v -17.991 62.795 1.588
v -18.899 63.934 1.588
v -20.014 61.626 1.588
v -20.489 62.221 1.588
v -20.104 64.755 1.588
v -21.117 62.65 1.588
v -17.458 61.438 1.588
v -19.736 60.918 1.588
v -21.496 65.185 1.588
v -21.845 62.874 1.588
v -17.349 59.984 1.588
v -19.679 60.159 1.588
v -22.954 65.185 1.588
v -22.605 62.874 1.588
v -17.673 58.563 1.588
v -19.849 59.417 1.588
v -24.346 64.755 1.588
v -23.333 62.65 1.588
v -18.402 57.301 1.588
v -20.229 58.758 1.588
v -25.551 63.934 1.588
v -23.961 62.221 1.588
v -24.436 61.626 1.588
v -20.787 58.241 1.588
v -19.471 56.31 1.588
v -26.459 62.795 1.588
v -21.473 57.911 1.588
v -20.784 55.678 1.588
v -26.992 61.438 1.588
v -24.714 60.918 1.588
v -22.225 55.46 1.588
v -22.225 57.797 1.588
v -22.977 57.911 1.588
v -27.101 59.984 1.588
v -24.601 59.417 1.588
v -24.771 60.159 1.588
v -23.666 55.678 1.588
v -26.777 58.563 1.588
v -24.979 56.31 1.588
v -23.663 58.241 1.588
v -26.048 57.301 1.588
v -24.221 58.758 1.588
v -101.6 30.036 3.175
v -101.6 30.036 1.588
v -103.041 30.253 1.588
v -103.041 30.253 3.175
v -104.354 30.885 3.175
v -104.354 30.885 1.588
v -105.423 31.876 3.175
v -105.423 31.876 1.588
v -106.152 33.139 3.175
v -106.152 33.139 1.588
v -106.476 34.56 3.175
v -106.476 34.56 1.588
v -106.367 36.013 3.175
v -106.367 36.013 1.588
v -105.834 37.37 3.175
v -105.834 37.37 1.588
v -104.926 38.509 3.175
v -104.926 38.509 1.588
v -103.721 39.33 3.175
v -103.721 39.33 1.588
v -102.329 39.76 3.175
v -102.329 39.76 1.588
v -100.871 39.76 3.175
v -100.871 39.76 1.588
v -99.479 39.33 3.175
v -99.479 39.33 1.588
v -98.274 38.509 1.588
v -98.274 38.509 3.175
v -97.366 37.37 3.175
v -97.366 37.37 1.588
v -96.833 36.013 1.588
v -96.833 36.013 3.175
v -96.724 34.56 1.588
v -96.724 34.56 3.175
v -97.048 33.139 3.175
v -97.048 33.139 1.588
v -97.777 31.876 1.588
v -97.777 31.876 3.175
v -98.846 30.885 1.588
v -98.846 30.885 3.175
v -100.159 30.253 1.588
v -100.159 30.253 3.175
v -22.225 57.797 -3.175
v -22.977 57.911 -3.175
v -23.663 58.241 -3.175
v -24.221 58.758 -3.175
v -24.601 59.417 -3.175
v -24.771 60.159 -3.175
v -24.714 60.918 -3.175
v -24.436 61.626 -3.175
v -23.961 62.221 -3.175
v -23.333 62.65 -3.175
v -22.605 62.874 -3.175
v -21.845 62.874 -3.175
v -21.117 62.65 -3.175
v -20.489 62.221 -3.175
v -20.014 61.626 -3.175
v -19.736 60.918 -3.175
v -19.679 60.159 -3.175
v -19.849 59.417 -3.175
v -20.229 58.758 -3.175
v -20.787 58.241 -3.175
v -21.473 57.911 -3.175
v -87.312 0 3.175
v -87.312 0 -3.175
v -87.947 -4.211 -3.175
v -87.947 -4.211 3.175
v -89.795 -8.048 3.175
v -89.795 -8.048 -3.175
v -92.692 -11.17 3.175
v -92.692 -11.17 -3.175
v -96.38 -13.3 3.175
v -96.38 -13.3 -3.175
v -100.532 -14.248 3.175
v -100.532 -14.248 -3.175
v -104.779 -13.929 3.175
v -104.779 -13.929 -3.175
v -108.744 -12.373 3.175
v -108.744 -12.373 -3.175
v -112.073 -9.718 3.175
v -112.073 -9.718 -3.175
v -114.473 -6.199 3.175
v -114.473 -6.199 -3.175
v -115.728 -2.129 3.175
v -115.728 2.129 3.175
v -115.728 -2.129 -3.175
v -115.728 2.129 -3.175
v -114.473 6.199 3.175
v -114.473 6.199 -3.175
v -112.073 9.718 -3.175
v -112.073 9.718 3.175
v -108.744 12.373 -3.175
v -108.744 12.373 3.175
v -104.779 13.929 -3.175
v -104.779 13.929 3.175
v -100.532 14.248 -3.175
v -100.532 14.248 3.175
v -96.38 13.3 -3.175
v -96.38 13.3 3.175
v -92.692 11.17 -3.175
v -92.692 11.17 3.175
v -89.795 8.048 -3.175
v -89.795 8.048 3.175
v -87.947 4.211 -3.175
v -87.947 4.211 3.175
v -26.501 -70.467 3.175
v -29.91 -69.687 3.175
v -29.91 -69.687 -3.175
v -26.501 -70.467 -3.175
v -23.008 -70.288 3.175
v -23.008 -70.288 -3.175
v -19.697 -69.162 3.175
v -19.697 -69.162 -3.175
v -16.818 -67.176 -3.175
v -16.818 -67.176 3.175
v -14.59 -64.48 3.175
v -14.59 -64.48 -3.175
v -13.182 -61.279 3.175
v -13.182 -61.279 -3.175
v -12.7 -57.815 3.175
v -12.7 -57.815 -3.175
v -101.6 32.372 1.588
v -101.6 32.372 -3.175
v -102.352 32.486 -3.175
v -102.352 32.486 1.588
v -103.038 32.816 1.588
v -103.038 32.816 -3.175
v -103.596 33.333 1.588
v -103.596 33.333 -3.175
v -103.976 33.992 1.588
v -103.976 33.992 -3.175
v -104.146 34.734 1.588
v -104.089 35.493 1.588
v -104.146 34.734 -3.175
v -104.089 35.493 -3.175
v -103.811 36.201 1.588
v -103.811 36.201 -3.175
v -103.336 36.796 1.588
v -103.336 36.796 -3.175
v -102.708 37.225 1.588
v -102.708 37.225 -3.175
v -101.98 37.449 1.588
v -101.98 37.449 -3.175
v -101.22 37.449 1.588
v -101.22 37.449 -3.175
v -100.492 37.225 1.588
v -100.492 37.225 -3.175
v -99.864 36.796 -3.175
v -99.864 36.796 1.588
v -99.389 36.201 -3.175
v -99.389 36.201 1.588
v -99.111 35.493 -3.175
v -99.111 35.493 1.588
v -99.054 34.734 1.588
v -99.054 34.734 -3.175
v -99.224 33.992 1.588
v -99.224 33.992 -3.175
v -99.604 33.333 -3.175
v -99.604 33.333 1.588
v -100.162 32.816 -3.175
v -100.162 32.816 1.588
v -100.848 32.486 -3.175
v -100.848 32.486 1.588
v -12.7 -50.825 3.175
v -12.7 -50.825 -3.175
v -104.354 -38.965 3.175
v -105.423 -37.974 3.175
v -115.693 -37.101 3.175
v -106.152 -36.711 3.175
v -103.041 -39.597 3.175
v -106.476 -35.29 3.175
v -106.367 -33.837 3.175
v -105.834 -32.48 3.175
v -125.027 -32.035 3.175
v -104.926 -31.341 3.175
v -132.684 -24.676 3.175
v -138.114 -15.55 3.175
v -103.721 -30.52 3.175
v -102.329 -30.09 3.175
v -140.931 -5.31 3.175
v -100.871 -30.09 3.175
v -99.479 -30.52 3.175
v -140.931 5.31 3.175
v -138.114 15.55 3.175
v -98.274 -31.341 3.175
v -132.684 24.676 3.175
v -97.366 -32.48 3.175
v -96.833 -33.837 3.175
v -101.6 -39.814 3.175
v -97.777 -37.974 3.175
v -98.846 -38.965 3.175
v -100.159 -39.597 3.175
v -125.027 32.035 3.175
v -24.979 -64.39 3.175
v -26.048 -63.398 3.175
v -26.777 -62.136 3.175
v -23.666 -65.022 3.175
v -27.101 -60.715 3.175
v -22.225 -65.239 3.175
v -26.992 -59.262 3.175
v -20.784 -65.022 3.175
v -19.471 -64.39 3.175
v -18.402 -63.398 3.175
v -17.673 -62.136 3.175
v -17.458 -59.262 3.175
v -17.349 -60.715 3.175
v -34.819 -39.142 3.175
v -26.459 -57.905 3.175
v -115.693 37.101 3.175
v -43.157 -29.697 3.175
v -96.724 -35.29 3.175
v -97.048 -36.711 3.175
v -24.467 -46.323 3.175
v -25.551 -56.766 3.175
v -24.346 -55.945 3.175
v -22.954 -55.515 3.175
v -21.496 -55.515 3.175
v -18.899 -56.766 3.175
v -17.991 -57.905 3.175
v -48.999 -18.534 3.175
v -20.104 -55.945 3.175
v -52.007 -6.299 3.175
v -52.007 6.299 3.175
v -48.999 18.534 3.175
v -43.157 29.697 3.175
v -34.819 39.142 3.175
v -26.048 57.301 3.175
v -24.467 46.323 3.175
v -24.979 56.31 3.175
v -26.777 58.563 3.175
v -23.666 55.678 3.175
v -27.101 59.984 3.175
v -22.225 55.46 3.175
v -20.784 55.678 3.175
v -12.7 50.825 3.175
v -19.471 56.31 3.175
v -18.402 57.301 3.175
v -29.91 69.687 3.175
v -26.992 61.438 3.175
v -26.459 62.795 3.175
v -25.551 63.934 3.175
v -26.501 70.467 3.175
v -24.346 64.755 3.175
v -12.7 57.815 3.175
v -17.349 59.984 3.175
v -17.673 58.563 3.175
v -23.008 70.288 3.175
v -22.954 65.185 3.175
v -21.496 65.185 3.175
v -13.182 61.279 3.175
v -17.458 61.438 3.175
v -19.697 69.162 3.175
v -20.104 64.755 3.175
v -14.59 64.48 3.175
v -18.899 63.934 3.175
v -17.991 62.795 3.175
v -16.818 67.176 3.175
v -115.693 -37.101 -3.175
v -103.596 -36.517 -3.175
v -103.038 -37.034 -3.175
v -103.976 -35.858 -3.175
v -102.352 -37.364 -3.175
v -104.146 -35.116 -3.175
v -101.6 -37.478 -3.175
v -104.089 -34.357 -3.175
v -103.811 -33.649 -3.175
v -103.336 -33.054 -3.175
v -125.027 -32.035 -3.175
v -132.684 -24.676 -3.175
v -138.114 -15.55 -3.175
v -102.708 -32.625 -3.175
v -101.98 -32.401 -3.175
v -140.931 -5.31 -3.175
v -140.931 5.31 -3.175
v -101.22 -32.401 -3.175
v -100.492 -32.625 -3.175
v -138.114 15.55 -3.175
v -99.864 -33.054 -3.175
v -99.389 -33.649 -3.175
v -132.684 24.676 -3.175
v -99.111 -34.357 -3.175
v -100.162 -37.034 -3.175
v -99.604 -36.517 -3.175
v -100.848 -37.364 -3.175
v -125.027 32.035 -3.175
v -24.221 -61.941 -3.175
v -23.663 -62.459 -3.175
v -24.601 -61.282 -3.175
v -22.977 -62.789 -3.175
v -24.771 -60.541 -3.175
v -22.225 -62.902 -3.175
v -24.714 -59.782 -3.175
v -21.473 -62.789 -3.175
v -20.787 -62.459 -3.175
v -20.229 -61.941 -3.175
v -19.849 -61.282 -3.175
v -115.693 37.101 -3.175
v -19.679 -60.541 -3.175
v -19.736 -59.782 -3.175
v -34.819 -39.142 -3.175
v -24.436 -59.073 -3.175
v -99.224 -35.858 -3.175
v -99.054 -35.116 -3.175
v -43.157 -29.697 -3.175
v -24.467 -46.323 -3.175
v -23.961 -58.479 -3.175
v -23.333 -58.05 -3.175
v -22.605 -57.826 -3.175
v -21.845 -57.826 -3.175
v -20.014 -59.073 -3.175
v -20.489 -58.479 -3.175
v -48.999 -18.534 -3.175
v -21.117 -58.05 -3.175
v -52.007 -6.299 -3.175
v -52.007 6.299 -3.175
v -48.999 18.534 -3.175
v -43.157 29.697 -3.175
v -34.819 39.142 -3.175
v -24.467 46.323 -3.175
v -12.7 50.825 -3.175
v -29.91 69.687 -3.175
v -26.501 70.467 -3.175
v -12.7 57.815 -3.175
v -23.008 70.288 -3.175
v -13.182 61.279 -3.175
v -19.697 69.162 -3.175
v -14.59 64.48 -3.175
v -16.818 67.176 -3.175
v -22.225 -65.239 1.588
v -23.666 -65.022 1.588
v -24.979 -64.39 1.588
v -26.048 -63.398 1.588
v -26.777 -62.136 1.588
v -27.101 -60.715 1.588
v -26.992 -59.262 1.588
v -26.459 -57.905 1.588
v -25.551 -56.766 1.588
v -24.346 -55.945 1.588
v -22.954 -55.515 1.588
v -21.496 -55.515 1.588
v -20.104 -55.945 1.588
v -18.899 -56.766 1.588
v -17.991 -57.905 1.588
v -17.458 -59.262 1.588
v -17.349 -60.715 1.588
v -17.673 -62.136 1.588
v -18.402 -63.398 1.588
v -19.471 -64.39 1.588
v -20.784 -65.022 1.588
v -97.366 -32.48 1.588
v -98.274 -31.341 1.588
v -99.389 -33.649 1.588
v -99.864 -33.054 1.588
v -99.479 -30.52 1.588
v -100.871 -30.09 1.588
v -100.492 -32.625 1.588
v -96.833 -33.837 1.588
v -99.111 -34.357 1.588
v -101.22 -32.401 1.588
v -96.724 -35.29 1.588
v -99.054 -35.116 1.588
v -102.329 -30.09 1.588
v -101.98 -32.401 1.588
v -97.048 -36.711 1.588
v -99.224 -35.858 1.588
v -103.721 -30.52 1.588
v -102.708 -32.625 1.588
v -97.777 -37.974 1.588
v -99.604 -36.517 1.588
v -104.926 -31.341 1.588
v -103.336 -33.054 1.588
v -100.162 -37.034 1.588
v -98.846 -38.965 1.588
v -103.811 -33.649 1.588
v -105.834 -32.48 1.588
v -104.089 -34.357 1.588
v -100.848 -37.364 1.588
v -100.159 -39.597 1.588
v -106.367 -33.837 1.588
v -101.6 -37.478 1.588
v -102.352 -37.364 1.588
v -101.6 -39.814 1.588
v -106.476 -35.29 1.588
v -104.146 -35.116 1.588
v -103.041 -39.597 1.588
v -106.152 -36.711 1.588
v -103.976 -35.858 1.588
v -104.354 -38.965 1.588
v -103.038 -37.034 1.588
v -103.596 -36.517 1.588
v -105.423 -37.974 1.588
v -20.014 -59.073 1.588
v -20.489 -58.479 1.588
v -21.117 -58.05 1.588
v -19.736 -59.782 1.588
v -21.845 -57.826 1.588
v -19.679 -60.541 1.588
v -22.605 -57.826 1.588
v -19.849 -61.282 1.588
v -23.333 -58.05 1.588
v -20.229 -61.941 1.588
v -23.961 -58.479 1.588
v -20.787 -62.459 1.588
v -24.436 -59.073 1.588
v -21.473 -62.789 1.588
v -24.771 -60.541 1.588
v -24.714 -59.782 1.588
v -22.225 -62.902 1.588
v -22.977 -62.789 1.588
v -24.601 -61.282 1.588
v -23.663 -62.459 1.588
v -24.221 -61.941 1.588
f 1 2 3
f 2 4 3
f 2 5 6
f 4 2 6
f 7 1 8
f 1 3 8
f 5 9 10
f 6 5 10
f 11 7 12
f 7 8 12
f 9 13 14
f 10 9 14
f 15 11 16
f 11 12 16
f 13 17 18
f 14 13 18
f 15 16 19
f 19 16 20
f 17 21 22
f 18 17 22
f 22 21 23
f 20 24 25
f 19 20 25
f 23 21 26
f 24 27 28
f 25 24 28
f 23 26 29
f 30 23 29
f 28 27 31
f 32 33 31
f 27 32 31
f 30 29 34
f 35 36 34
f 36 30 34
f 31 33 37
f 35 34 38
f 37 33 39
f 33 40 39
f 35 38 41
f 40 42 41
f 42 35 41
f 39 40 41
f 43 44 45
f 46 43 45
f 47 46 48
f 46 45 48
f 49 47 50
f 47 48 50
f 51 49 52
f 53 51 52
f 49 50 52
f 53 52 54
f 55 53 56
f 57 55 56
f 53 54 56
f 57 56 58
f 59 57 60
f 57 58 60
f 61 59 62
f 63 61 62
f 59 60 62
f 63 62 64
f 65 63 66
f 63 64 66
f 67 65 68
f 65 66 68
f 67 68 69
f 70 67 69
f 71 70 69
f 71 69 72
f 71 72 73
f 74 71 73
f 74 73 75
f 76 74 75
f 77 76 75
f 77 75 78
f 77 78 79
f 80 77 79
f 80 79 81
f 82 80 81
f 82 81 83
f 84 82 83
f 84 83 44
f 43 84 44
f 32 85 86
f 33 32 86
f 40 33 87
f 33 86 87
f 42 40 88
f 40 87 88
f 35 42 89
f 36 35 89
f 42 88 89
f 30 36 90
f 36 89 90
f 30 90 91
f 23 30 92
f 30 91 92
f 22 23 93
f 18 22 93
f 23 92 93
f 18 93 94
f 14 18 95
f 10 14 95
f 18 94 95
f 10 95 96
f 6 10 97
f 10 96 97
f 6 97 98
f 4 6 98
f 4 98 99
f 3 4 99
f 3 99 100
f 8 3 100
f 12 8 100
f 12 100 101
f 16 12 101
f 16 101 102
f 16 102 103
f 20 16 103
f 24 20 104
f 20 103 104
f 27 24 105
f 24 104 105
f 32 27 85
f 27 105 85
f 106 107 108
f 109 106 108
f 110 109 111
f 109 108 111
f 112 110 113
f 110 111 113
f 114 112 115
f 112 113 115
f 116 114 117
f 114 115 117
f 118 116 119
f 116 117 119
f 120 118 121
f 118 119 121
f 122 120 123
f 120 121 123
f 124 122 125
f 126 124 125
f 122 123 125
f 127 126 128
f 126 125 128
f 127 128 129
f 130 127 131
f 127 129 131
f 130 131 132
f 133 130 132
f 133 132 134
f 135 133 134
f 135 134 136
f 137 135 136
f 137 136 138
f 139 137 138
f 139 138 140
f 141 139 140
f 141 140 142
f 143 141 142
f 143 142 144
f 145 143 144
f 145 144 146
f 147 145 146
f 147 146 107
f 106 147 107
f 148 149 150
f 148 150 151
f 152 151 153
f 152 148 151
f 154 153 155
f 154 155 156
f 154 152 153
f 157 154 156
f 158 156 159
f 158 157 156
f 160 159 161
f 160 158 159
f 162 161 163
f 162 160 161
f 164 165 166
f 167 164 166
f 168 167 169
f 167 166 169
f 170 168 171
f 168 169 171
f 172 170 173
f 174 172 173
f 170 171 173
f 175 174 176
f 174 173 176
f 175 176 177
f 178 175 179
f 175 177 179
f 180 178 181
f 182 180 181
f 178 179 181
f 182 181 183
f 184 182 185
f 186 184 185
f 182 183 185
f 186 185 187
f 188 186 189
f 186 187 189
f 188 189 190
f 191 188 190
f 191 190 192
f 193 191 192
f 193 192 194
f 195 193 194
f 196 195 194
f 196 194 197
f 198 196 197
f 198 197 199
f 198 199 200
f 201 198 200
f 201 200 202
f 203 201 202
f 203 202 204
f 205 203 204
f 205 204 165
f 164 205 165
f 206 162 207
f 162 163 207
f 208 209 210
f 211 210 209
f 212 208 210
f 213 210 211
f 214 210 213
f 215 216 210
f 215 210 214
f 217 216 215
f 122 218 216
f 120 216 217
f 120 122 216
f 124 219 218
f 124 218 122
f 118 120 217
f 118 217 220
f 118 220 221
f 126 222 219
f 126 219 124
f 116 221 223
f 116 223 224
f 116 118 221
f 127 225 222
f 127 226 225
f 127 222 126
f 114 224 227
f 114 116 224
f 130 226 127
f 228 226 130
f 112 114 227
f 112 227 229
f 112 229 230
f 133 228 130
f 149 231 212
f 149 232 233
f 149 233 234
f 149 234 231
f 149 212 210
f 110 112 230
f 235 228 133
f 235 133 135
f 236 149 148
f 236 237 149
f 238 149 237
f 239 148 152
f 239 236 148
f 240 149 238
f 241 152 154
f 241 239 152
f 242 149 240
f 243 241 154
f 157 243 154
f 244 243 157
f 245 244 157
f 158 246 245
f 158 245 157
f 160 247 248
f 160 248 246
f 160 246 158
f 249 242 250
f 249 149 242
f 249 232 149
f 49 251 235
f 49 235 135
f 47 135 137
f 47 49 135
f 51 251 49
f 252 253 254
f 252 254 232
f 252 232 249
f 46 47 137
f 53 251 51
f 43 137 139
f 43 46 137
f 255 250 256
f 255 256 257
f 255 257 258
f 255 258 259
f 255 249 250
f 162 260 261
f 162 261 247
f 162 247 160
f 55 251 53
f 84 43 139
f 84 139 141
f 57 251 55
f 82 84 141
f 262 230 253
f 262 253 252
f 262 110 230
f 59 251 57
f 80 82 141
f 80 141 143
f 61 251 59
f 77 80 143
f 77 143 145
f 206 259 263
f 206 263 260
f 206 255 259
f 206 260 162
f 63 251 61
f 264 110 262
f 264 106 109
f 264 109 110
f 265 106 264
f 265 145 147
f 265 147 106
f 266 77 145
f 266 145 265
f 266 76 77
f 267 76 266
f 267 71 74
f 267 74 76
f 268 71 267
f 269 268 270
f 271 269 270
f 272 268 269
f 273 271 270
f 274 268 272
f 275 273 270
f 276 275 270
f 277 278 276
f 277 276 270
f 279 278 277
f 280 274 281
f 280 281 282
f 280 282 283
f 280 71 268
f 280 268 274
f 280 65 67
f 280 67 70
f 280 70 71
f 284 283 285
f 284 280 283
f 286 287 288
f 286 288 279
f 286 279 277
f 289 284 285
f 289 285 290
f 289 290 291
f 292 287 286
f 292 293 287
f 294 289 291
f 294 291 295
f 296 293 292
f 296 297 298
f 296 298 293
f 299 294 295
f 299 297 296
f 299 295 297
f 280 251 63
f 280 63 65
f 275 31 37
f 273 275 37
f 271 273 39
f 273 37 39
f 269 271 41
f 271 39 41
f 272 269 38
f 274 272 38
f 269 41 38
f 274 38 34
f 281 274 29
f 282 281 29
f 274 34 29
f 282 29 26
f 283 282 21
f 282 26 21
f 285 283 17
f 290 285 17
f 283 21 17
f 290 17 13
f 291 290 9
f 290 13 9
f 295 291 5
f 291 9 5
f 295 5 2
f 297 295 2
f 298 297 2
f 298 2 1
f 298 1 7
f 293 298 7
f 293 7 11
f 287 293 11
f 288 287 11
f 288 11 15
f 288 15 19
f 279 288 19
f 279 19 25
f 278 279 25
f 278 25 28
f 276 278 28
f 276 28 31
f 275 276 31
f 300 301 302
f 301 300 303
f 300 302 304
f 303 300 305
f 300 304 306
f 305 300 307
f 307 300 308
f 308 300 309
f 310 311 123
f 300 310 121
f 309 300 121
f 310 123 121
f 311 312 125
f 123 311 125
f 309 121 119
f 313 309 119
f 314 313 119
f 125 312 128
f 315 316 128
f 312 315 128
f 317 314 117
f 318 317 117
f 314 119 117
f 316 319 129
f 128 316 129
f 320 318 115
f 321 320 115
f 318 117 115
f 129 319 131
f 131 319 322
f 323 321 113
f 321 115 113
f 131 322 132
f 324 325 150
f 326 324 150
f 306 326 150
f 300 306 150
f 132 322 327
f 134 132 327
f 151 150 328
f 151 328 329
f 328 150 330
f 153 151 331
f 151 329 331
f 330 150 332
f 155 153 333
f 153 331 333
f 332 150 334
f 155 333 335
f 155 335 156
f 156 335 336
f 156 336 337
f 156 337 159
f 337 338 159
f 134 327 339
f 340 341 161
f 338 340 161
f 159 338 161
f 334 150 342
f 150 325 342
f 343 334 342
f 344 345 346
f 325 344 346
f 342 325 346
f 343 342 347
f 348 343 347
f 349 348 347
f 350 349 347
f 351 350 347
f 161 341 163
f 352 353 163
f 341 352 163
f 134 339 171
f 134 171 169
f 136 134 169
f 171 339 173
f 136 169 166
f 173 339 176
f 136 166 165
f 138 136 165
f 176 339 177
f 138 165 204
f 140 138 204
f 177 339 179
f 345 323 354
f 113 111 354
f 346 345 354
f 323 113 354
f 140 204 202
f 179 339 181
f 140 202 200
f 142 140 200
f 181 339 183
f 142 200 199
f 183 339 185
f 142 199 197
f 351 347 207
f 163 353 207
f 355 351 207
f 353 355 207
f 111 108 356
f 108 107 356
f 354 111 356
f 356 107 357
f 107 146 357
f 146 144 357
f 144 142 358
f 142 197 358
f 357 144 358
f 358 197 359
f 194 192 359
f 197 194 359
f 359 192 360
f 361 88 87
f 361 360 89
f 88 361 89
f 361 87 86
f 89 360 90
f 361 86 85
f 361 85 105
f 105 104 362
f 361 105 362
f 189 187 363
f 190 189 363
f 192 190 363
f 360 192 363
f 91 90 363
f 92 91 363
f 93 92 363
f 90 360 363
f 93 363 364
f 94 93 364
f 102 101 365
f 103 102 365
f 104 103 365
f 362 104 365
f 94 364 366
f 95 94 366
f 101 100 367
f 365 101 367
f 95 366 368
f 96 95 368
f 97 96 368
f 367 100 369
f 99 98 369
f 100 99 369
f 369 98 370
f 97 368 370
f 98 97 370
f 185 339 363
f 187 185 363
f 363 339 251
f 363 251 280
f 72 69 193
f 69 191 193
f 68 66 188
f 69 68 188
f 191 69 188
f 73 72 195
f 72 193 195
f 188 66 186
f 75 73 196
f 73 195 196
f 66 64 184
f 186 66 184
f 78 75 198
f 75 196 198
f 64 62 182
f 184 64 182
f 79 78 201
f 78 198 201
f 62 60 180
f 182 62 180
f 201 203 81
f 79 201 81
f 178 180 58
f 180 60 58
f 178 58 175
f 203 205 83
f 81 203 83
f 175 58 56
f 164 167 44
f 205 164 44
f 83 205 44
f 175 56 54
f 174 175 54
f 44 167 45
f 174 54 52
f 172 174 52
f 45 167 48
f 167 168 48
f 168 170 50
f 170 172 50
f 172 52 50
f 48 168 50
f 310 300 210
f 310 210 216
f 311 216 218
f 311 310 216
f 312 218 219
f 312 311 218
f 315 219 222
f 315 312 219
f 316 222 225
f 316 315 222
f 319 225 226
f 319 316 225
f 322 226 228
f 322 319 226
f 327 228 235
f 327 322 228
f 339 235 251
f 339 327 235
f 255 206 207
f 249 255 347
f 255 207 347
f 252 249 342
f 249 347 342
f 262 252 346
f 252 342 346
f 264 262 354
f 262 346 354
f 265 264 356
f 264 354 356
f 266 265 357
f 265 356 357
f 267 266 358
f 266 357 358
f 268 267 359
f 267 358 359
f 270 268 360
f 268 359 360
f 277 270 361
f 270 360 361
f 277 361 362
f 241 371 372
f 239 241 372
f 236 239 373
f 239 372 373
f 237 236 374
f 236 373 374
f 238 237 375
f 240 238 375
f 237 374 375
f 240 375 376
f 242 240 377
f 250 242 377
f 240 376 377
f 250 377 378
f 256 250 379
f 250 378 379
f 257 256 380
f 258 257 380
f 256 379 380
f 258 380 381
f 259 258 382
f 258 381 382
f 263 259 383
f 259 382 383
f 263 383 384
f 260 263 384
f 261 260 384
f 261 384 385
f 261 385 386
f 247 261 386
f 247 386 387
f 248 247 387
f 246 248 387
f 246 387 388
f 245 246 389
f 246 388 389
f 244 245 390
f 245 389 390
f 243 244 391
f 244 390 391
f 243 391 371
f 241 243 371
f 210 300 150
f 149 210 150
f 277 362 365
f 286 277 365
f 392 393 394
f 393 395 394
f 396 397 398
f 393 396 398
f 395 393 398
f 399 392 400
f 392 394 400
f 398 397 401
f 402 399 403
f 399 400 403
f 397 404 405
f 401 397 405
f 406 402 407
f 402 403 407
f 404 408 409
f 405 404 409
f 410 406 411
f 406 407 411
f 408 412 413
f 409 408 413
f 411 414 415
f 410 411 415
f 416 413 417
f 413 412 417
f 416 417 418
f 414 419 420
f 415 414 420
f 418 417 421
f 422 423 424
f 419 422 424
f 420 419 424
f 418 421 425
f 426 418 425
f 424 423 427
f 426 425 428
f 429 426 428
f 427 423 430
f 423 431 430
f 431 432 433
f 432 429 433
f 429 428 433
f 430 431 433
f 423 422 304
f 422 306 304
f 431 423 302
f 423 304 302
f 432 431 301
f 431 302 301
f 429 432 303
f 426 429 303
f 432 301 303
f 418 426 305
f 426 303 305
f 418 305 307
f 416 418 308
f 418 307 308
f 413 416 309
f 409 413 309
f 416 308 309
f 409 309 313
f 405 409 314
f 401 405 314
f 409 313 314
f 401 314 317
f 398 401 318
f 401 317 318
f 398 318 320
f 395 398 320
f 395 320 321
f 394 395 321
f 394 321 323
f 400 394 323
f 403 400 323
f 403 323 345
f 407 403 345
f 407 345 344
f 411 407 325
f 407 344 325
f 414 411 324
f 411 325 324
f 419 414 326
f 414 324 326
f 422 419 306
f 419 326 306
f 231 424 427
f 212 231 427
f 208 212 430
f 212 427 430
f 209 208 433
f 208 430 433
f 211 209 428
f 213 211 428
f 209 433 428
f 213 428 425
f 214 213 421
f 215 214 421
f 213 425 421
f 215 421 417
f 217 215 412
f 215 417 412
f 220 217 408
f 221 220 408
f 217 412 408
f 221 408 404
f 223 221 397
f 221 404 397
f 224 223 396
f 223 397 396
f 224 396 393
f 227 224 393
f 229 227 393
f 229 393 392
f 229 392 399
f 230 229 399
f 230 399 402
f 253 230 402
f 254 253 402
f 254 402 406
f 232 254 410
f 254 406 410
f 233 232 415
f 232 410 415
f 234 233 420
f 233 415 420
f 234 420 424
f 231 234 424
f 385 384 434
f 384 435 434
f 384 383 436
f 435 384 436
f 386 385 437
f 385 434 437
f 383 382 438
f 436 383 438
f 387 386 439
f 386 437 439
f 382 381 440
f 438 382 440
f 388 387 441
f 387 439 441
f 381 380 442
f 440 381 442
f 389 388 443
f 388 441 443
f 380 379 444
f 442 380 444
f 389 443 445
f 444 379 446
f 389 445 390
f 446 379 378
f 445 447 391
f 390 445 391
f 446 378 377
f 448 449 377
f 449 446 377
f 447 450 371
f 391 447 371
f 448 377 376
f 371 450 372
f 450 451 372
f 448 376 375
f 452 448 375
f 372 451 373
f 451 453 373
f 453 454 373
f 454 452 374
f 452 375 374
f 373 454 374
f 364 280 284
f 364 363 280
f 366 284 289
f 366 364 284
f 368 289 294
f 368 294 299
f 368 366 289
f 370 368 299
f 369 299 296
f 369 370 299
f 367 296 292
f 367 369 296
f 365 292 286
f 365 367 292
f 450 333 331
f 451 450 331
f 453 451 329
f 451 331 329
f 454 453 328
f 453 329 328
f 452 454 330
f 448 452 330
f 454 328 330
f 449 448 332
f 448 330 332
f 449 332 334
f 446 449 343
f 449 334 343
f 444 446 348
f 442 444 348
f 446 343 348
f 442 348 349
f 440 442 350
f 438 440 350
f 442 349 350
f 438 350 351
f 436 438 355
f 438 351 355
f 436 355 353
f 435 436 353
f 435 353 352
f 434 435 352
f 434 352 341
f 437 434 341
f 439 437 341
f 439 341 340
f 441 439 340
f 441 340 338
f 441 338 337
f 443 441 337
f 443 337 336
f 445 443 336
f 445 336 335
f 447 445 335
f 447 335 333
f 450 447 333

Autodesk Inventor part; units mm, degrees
ref_plane "YZ Plane" through (0, 0, 0) normal (1, 0, 0) x (0, 1, 0)
ref_plane "XZ Plane" through (0, 0, 0) normal (0, 1, 0) x (-1, 0, 0)
ref_plane "XY Plane" through (0, 0, 0) normal (0, 0, 1) x (1, 0, 0)
sketch "Sketch1" plane through (0, 0, 0) normal (0, 0, 1) x (1, 0, 0)
  line L0 (-179.705, 0) -> (89.2175, 0) projected
  line L1 (0, -106.7147) -> (0, 106.7147) projected
  circle A0 centre (0, 0) radius 50.8 construction
  arc A1 (-12.7, 50.8248) -> (-12.7, -50.8248) centre (0, 0) ccw
  line L2 (0, -55.5625) -> (0, -68.2625)
  circle A2 centre (-101.6, 0) radius 14.2875
  line L3 (-101.6, -14.2875) -> (-101.6, 14.2875) construction
  line L4 (-115.6934, 37.1008) -> (-12.7, 76.2248)
  line L5 (-115.6934, -37.1008) -> (-12.7, -76.2248)
  arc A3 (-115.6934, 37.1008) -> (-115.6934, -37.1008) centre (-101.6, 0) ccw
  line L6 (-12.7, 50.8248) -> (-12.7, 76.2248)
  line L7 (-12.7, -76.2248) -> (-12.7, -50.8248)
  dimension "d0" = 101.6
  dimension "d1" = 1.5875
  dimension "d2" = 28.575
  dimension "d4" = 101.6
  dimension "d7" = 25.4
  dimension "d8" = 25.4
  dimension "d10" = 12.7
extrude "Extrusion1" add sketch "Sketch1" along normal mid plane 6.35 contours A3 L4 L6 A1 L0 A2 | L0 A2 A1 L7 L5 A3
sketch "Sketch2" plane through (0, 0, 3.175) normal (0, 0, 1) x (1, 0, 0)
  line L0 (-12.7, 76.2248) -> (-12.7, 50.8248) projected
  line L1 (-167.005, 0) -> (13.0175, 0) projected
  point P0 (-22.225, 60.3498)
  point P1 (-22.225, -60.3498)
  dimension "d13" = 9.525
  dimension "d14" = 15.875
hole "Hole1" at (-22.225, 60.3498, 3.175) at (-22.225, -60.3498, 3.175) direction (0, 0, -1) diameter 5.1054 end through all counterbore diameter 9.779 counterbore depth 1.5875 clearance for "Flat Head Machine Screw (82)" size "#10" standard "Ansi Unified Screw Threads"
fillet "Fillet1" radius 12.7 1 edges at (-12.7, 76.2248, 0)
fillet "Fillet1" radius 12.7 1 edges at (-12.7, -76.2248, 0)
sketch "Sketch3" plane through (0, 0, 3.175) normal (0, 0, 1) x (1, 0, 0)
  arc A0 (-115.6934, 37.1008) -> (-115.6934, -37.1008) centre (-101.6, 0) ccw projected
  line L0 (-169.545, 0) -> (28.2575, 0) projected
  point P0 (-101.6, 34.925)
  point P1 (-101.6, -34.925)
  dimension "d24" = 34.925
hole "Hole2" at (-101.6, 34.925, 3.175) at (-101.6, -34.925, 3.175) direction (0, 0, -1) diameter 5.1054 end through all counterbore diameter 9.779 counterbore depth 1.5875 clearance for "Flat Head Machine Screw (82)" size "#10" standard "Ansi Unified Screw Threads"
properties part number "plate2"
